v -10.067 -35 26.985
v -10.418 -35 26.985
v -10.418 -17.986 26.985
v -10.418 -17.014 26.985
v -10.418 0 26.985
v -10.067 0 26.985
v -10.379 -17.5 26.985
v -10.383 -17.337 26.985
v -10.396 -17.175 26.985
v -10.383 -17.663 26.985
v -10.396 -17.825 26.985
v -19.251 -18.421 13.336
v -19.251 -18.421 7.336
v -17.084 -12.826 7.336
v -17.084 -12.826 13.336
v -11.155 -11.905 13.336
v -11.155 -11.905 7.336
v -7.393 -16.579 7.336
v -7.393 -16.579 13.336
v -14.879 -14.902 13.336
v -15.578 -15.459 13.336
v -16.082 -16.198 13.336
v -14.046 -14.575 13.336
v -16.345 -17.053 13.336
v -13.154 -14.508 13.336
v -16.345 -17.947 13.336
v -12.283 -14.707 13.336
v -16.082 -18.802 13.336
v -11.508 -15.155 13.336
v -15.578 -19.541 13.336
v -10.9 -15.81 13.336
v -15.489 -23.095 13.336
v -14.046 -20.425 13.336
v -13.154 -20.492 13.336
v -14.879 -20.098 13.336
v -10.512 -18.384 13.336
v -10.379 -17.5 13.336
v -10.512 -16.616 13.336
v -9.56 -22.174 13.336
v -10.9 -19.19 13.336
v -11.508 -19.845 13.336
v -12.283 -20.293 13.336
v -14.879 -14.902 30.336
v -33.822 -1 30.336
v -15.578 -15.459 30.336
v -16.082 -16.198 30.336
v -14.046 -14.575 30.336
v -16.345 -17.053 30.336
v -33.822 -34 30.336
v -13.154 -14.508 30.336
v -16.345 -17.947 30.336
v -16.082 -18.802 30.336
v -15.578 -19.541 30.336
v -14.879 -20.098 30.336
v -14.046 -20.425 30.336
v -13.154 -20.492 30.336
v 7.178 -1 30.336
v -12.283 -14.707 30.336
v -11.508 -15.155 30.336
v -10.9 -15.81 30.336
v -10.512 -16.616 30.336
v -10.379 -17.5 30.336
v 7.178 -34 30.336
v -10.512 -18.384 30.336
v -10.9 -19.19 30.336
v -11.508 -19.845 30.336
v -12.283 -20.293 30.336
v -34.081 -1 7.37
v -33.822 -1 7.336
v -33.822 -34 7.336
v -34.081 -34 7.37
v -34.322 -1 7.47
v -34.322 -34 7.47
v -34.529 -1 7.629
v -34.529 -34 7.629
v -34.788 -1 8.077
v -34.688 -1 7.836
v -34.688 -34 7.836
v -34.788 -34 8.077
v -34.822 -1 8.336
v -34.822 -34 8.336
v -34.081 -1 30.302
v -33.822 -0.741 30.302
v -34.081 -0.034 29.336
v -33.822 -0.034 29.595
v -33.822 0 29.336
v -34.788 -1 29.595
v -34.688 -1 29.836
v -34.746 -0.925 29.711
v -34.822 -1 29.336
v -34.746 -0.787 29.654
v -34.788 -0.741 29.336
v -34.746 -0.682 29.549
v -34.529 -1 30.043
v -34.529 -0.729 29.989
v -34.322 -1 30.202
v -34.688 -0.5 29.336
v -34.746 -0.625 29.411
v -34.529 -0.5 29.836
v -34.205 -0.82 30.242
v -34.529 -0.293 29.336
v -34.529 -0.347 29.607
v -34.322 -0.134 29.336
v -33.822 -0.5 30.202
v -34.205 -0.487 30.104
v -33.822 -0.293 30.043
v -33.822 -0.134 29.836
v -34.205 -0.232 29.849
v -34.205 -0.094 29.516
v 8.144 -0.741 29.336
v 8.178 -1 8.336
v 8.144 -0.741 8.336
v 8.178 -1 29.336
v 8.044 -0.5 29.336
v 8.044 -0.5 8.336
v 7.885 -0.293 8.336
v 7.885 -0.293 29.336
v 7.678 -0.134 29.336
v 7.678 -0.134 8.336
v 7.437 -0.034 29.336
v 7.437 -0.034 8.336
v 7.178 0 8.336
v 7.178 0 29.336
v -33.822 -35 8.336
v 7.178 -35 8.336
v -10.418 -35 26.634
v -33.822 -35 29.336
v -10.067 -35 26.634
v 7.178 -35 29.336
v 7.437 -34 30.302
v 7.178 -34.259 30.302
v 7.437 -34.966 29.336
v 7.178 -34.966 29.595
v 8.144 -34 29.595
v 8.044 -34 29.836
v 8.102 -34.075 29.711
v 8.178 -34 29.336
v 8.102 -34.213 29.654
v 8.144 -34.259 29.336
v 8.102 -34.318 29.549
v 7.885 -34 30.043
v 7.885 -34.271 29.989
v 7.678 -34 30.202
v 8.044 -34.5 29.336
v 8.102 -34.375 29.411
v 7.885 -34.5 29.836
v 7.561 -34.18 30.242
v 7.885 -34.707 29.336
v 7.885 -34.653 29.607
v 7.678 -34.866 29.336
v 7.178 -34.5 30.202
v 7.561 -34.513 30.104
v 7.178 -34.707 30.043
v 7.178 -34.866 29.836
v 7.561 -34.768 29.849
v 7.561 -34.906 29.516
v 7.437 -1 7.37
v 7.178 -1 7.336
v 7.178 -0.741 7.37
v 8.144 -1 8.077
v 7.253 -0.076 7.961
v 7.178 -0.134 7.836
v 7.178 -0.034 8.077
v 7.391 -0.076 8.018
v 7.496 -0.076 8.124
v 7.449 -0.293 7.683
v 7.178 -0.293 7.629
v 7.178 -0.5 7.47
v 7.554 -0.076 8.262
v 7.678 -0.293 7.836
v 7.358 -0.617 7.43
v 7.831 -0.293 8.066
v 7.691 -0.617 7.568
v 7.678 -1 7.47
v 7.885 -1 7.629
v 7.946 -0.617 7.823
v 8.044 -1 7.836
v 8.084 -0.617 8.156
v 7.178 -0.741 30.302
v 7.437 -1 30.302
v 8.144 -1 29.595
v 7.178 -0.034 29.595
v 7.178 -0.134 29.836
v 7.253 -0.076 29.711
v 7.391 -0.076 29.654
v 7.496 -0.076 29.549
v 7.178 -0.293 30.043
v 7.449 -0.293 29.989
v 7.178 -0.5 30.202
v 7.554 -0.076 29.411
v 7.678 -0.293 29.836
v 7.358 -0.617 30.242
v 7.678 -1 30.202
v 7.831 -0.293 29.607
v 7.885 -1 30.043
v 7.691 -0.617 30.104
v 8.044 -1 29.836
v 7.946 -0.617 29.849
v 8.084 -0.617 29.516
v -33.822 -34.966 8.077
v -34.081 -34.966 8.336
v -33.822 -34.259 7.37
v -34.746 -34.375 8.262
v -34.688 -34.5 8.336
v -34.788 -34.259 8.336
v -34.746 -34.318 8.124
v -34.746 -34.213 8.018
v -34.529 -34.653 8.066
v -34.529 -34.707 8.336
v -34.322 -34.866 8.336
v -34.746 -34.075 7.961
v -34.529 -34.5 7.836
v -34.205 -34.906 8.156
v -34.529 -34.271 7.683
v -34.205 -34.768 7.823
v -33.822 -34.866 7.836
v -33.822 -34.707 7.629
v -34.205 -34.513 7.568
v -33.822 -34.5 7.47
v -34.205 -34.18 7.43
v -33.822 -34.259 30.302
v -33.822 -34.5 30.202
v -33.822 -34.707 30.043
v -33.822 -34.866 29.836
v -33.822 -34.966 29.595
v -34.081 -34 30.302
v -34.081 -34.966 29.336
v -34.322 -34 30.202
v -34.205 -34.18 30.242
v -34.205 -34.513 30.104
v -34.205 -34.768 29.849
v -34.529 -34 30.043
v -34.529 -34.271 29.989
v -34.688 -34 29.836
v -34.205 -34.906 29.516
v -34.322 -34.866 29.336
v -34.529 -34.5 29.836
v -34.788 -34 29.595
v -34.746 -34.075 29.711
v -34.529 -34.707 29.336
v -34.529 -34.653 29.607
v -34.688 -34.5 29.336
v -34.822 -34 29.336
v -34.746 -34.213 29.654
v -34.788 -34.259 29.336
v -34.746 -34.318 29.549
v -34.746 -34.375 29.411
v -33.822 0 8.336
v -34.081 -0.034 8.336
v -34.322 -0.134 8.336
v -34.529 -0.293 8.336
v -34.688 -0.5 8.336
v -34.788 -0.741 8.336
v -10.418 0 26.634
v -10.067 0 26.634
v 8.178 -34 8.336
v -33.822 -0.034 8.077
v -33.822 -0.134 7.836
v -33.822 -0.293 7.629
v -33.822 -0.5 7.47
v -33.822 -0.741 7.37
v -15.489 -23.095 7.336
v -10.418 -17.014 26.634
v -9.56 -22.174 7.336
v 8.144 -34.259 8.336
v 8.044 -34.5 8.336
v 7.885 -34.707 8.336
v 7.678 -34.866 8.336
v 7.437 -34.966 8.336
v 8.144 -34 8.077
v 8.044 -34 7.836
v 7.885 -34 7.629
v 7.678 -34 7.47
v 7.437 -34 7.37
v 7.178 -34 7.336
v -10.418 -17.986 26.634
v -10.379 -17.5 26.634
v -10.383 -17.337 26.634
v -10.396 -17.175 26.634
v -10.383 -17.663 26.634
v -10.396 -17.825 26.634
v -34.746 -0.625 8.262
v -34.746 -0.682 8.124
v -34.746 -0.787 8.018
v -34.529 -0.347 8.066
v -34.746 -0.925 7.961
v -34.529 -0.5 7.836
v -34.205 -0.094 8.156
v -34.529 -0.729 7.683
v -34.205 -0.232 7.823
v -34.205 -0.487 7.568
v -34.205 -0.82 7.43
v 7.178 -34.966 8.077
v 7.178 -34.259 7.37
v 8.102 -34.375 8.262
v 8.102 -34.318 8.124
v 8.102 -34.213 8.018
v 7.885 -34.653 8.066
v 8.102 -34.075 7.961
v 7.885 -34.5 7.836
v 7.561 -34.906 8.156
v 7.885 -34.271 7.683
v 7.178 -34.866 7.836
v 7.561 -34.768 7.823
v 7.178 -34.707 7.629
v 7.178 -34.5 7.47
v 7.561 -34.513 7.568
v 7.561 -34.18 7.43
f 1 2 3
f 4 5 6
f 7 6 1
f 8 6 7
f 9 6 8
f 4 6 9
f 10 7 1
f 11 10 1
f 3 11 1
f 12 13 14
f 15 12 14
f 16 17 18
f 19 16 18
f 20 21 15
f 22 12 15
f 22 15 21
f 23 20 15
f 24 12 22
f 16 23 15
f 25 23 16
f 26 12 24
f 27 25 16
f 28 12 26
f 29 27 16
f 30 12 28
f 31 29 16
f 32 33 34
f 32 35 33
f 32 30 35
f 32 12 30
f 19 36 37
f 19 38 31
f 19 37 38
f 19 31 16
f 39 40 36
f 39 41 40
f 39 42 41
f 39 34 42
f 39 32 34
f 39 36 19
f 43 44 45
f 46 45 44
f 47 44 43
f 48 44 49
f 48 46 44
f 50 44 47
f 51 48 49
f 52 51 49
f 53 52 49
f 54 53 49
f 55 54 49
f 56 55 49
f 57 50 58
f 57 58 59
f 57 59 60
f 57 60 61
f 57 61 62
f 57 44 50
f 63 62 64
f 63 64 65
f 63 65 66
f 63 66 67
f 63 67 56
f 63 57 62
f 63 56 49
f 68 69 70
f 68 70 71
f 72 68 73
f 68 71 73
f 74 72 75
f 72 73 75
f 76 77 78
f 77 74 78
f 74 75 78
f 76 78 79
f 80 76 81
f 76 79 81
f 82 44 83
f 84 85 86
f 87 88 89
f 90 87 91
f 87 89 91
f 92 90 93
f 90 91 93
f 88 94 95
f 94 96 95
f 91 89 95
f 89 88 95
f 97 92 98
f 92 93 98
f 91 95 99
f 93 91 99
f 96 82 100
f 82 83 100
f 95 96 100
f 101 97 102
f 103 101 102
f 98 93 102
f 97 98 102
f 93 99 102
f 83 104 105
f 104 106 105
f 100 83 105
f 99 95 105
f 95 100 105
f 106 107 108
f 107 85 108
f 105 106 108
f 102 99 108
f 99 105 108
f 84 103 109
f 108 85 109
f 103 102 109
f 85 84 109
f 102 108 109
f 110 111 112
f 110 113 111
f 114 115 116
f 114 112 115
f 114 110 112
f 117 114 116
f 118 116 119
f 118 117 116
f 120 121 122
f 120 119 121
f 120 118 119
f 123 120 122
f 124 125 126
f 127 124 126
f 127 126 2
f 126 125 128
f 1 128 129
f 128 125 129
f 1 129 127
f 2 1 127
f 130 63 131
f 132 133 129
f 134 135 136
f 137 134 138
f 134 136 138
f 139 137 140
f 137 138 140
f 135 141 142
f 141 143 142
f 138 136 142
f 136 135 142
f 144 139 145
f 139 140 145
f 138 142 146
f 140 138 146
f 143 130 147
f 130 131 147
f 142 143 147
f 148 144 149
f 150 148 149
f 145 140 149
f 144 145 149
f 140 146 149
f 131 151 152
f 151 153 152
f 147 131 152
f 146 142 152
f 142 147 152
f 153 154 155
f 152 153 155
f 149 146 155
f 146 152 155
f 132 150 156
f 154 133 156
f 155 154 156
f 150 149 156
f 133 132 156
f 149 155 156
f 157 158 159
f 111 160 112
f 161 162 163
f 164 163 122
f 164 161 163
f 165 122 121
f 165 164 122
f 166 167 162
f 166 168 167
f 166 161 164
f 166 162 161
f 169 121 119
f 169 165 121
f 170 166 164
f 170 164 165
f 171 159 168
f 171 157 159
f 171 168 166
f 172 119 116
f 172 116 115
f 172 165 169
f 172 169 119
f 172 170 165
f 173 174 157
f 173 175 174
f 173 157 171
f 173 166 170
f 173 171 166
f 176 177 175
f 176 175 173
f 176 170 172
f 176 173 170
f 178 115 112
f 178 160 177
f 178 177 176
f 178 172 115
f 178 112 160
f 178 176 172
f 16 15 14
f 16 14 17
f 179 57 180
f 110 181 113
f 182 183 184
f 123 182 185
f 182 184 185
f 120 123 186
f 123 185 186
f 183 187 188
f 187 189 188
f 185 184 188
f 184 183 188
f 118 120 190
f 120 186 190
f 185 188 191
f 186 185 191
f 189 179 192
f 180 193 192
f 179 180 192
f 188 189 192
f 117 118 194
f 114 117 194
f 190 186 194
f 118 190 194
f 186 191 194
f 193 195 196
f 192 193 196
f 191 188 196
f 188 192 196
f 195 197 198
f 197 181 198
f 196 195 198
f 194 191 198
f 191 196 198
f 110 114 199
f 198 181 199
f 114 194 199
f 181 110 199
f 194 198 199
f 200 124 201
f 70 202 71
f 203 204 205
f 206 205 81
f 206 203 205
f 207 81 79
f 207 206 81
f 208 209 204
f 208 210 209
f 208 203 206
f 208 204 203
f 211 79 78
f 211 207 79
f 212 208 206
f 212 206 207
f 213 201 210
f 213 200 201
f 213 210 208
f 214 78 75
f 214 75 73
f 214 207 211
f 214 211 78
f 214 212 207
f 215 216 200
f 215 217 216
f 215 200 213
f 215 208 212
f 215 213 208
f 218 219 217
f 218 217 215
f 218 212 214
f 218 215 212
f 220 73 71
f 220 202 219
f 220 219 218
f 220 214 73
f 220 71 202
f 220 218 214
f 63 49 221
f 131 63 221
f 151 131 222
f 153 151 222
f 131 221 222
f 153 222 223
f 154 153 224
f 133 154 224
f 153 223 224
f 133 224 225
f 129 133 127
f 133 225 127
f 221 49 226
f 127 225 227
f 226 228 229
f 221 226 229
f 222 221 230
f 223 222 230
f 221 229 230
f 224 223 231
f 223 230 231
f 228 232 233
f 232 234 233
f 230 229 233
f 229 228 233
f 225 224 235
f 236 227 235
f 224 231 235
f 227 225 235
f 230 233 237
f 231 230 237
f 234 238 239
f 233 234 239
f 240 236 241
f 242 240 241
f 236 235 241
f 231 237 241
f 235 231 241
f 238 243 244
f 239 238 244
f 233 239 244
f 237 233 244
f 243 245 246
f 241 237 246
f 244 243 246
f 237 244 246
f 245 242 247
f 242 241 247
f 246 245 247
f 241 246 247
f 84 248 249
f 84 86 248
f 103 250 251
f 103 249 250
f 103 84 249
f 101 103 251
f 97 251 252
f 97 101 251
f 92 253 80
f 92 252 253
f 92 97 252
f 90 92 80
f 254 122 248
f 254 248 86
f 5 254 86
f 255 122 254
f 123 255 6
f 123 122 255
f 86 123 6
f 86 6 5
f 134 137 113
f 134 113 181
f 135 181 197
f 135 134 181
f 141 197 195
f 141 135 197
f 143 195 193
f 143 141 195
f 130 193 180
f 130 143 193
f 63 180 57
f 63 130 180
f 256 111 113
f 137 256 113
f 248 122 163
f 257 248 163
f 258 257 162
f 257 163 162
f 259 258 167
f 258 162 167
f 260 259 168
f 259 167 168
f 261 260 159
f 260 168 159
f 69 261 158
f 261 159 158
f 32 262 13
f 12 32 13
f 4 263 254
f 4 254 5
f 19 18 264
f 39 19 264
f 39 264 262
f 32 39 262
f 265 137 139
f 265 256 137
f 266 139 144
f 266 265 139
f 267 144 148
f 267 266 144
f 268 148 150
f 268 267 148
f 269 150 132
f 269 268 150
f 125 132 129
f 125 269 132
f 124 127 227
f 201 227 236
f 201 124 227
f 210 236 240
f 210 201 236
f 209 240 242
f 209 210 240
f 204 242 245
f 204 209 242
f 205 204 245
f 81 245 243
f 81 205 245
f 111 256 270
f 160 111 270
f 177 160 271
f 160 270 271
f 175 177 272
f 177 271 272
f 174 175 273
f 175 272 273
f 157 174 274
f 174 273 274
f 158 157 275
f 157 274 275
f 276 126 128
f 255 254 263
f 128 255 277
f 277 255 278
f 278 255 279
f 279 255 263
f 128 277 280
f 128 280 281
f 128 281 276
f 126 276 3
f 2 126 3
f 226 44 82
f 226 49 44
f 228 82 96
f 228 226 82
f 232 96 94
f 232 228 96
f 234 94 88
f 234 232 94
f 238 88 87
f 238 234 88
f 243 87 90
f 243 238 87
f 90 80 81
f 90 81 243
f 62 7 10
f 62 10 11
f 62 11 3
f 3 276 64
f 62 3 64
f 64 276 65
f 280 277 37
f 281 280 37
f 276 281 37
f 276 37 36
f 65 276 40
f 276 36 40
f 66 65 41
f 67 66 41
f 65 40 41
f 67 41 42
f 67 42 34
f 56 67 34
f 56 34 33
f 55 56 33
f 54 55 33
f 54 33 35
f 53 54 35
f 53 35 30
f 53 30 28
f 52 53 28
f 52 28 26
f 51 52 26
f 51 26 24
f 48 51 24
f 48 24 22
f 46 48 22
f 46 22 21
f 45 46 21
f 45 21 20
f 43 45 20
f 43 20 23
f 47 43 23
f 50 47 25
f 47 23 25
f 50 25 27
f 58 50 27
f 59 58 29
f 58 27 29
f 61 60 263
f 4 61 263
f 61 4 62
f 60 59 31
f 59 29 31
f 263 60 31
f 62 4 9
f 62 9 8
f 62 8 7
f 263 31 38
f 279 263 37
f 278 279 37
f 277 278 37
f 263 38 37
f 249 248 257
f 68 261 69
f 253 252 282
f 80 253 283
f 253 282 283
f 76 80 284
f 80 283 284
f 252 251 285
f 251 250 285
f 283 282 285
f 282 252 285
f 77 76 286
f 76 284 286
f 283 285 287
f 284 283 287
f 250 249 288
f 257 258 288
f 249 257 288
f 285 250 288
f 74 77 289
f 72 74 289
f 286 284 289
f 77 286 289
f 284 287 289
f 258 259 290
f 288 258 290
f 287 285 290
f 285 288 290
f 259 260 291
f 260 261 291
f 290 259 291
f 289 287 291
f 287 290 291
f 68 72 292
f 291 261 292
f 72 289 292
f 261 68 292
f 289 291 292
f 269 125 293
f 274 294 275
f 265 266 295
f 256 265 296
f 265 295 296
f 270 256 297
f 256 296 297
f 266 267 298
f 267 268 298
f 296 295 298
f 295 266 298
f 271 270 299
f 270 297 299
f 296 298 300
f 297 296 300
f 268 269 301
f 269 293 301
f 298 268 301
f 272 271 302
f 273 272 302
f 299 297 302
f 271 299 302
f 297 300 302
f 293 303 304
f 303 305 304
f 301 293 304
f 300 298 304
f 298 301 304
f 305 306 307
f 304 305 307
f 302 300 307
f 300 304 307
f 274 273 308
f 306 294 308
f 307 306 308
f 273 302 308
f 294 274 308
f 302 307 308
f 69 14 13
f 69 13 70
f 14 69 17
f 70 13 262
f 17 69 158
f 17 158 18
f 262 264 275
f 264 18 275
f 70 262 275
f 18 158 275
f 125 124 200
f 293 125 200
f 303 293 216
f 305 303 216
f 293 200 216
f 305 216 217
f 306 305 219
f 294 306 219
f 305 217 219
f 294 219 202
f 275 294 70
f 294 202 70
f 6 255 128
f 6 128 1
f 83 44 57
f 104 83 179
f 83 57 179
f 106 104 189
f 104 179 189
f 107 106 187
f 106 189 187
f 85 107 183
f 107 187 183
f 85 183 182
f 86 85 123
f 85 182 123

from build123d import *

# Parameters (mm, degrees)
F0_W      = 40
F0_H      = 23
F0_W_2    = 0.3508773884
F0_H_2    = 0.3508765315
F1_DEPTH  = 35
F2_DEPTH  = 3
F3_R      = 1
F4_R      = 1
F8_DEPTH  = 6
F10_R     = 3
F11_DEPTH = 17


# Not quite as in the source:
# - two fillets or chamfers of one size are made in one step


with BuildPart() as f1:
    # F0 (on Front) → F1 (new body)
    with BuildSketch(Plane.XZ):
        with Locations((-11.8218250573, 18.8361621085)):
            Rectangle(F0_W, F0_H)
        with Locations((-10.2428785232, 26.8098455974)):
            Rectangle(F0_W_2, F0_H_2, mode=Mode.SUBTRACT)
    extrude(amount=F1_DEPTH)

    # F2 (add): a face of the model
    f2_faces = [f1.faces().sort_by_distance(p)[0] for p in [
        (-31.8218250573, -17.5, 18.8361621085),
    ]]
    extrude(f2_faces, amount=F2_DEPTH)

    # F3
    f3_edges = [f1.edges().sort_by_distance(p)[0] for p in [
        (-13.321825, -35, 30.336162),
    ]]
    fillet(f3_edges, radius=F3_R)

    # F4
    f4_edges = [f1.edges().sort_by_distance(p)[0] for p in [
        (-13.321825, -35, 7.336162),
        (8.178175, -17, 30.336162),
        (8.178175, -17.5, 7.336162),
        (-13.321825, 0, 30.336162),
        (-13.321825, 0, 7.336162),
        (-34.821825, -17, 30.336162),
        (8.178175, -34.707107, 30.043269),
        (8.178175, 0, 18.836162),
        (8.178175, -35, 18.336162),
        (-34.821825, -34.707107, 30.043269),
        (-34.821825, 0, 18.836162),
        (-34.821825, -35, 18.336162),
        (-34.821825, -17.5, 7.336162),
    ]]
    fillet(f4_edges, radius=F4_R)

    # F7 (on face) → F8 (cut)
    with BuildSketch(Plane(origin=(0, 0, 7.3361621085), x_dir=(1, 0, 0), z_dir=(0, 0, -1))):
        Polygon((-15.4886602973, 23.0950714957), (-19.2507167286, 18.4210013842), (-17.0838814885, 12.8259298884), (-11.1549898172, 11.9049285043), (-7.3929333859, 16.5789986158), (-9.559768626, 22.1740701116), align=None)
    extrude(amount=-F8_DEPTH, mode=Mode.SUBTRACT)

    # F10 (on face) → F11 (cut, through all)
    with BuildSketch(Plane(origin=(0, 0, 13.3361621085), x_dir=(1, 0, 0), z_dir=(0, 0, -1))):
        with Locations((-13.3786574006, 17.5000000745)):
            Circle(F10_R)
    extrude(amount=-F11_DEPTH, mode=Mode.SUBTRACT)


solid = f1.part
